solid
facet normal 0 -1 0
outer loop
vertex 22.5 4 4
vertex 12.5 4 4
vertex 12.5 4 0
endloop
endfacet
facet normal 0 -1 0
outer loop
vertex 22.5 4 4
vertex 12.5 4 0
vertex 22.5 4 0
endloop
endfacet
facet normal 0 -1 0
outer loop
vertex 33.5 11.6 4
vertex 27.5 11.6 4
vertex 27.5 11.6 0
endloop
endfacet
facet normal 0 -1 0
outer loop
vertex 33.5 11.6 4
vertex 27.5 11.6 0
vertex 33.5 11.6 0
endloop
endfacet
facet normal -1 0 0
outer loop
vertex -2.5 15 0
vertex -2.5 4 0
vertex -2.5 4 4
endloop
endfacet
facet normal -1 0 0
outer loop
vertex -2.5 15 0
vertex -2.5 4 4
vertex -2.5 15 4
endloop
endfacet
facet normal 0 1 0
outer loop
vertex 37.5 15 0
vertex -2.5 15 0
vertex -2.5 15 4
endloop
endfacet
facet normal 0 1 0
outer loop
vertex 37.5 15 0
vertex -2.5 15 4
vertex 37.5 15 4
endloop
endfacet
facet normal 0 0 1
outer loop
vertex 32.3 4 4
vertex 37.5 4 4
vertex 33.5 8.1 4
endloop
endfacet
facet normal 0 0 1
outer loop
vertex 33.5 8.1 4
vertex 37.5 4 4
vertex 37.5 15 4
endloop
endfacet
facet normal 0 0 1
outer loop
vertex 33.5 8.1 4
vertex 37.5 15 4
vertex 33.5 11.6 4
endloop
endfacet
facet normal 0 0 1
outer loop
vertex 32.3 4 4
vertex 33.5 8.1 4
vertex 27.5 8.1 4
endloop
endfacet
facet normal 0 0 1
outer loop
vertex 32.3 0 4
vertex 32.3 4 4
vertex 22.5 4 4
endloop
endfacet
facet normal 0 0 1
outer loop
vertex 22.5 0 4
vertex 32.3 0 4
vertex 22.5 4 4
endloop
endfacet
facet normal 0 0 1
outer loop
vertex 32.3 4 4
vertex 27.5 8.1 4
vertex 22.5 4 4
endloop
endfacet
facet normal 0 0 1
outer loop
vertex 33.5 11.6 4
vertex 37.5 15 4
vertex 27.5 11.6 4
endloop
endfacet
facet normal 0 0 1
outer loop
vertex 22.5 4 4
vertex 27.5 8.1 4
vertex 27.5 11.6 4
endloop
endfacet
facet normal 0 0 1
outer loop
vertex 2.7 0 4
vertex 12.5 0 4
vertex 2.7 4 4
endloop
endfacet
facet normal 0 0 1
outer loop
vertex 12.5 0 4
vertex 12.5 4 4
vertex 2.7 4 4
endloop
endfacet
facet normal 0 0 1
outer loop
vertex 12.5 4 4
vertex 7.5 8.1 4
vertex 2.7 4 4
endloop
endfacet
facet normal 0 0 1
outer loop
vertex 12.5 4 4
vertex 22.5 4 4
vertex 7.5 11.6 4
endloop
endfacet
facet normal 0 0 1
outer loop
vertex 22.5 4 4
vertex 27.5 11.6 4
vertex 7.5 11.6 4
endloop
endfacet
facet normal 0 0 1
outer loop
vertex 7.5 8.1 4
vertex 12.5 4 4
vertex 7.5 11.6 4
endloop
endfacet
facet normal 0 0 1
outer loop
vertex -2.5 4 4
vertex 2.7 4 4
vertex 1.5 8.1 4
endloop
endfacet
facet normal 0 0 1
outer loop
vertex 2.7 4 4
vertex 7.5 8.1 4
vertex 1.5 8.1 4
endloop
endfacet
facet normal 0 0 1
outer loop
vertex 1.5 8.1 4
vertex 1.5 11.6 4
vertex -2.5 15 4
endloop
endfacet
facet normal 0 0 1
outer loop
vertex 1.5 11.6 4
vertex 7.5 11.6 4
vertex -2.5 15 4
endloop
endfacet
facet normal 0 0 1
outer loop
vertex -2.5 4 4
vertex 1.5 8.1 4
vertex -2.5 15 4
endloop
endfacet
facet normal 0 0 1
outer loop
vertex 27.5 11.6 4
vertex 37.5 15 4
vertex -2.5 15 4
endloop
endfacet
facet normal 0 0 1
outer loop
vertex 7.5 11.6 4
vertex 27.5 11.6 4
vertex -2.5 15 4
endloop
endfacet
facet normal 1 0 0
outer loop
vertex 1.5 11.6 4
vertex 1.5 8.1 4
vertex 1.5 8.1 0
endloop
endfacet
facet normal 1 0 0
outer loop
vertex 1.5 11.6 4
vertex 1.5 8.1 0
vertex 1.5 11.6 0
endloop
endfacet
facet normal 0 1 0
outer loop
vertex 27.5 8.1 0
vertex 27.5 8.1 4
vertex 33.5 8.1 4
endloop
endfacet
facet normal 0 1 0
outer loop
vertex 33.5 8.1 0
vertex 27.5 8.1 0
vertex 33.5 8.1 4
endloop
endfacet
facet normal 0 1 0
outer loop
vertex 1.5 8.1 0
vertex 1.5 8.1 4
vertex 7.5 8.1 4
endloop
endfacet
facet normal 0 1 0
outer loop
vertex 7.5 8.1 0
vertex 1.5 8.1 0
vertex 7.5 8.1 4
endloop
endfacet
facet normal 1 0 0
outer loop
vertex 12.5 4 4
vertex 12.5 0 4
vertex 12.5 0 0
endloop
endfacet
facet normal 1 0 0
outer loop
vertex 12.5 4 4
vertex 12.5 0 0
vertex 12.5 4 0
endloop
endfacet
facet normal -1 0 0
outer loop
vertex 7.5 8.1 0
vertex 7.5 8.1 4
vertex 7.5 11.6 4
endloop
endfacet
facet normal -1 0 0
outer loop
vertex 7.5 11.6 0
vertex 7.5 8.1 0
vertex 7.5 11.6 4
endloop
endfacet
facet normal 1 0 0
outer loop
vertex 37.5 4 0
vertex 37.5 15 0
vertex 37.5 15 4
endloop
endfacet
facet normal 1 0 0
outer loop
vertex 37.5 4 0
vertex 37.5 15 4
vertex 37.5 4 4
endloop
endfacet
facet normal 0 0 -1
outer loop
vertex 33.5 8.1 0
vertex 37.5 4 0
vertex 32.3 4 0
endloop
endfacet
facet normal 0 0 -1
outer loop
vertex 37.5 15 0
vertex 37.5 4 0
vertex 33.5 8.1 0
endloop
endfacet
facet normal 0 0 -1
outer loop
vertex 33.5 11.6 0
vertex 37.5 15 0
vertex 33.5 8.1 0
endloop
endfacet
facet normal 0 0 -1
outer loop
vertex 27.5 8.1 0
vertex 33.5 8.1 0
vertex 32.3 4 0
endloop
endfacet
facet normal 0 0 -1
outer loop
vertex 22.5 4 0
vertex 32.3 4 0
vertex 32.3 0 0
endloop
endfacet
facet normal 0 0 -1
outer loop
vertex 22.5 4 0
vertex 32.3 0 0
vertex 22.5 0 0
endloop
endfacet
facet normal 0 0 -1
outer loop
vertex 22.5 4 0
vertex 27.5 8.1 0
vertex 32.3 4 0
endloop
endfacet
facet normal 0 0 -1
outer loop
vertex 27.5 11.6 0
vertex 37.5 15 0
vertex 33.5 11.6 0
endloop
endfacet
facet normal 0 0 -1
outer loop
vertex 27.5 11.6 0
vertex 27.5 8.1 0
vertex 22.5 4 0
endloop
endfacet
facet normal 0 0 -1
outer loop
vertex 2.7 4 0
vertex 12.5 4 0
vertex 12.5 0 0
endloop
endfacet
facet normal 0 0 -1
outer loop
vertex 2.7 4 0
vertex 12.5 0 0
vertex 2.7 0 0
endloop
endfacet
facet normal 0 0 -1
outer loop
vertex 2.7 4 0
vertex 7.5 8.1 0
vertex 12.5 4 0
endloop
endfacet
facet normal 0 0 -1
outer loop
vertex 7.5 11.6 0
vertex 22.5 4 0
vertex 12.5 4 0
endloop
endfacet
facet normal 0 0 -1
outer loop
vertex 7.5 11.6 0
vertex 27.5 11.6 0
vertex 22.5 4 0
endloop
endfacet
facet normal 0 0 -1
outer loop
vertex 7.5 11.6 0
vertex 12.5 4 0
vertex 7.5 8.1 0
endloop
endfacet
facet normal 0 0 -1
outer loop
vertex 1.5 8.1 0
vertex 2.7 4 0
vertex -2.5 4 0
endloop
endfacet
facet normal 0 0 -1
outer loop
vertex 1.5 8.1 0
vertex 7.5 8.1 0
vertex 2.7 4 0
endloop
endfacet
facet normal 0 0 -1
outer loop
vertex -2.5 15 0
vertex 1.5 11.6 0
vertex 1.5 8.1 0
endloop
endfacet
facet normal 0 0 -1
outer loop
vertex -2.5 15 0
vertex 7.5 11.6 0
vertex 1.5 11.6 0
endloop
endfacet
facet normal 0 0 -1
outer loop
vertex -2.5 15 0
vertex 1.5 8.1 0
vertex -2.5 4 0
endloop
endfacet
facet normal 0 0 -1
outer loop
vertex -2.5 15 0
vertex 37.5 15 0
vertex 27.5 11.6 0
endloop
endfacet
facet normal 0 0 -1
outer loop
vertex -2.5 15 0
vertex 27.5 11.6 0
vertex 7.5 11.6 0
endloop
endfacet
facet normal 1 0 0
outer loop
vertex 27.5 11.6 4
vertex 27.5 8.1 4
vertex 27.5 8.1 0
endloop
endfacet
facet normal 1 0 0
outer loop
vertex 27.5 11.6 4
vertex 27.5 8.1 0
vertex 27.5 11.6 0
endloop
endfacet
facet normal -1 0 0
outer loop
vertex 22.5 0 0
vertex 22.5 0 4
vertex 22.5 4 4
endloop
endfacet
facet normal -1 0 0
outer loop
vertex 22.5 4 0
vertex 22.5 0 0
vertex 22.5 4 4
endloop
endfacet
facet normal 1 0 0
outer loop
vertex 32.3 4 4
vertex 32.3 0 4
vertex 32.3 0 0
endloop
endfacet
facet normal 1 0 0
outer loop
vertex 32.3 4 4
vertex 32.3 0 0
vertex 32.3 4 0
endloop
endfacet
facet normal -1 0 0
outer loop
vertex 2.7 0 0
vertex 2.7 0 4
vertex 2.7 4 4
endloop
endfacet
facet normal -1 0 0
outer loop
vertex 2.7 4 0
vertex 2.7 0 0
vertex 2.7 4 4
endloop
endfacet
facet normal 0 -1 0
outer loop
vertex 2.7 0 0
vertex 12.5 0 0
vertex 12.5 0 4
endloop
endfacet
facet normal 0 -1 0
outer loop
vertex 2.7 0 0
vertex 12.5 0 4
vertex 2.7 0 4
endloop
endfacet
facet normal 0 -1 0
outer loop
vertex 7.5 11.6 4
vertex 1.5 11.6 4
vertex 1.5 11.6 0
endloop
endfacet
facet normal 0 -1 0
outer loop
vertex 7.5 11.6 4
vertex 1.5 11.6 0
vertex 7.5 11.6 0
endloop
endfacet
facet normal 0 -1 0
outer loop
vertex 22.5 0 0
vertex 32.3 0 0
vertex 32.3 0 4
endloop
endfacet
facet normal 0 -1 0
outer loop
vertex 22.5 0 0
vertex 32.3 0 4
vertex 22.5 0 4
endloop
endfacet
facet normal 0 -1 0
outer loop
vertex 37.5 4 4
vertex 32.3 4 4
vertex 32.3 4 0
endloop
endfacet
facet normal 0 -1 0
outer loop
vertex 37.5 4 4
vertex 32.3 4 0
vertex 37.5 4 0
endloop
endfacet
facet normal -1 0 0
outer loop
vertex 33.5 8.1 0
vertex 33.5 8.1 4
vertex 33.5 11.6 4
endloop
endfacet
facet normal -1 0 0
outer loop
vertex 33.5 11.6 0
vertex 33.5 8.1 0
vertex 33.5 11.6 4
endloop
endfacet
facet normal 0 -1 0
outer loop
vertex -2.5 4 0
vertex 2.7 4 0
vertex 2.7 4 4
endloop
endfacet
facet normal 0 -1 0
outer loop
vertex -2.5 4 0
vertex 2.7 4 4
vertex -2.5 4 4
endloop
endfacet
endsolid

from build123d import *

# Parameters (mm, degrees)
AUFSATZ_LINEAR_AUSTRAGEN1_DEPTH = 4
SCHNITT_LINEAR_AUSTRAGEN1_REACH = 6
SKIZZE3_W                       = 2.7
SKIZZE3_H                       = 4
SKIZZE3_W_2                     = 10
SCHNITT_LINEAR_AUSTRAGEN2_REACH = 6
SKIZZE4_W                       = 6
SKIZZE4_H                       = 3.5


with BuildPart() as part:
    # Skizze2 → Aufsatz-Linear austragen1 (new body)
    with BuildSketch(Plane.XY):
        Polygon((0, 0), (0, 4), (-2.5, 4), (-2.5, 15), (37.5, 15), (37.5, 4), (35, 4), (35, 0), align=None)
    extrude(amount=AUFSATZ_LINEAR_AUSTRAGEN1_DEPTH)

    # Skizze3 → Schnitt-Linear austragen1 (cut, up to next)
    with BuildSketch(Plane.XY.offset(4), mode=Mode.PRIVATE) as schnitt_linear_austragen1_sk1:
        with Locations((1.35, 2)):
            Rectangle(SKIZZE3_W, SKIZZE3_H)
    schnitt_linear_austragen1_tool1 = extrude(schnitt_linear_austragen1_sk1.sketch, amount=-SCHNITT_LINEAR_AUSTRAGEN1_REACH, mode=Mode.PRIVATE) & part.part
    add(schnitt_linear_austragen1_tool1.solids().sort_by_distance((1.35, 2, 4))[0], mode=Mode.SUBTRACT)
    # Skizze3 → Schnitt-Linear austragen1 (cut, up to next)
    with BuildSketch(Plane.XY.offset(4), mode=Mode.PRIVATE) as schnitt_linear_austragen1_sk2:
        with Locations((17.5, 2)):
            Rectangle(SKIZZE3_W_2, SKIZZE3_H)
    schnitt_linear_austragen1_tool2 = extrude(schnitt_linear_austragen1_sk2.sketch, amount=-SCHNITT_LINEAR_AUSTRAGEN1_REACH, mode=Mode.PRIVATE) & part.part
    add(schnitt_linear_austragen1_tool2.solids().sort_by_distance((17.5, 2, 4))[0], mode=Mode.SUBTRACT)
    # Skizze3 → Schnitt-Linear austragen1 (cut, up to next)
    with BuildSketch(Plane.XY.offset(4), mode=Mode.PRIVATE) as schnitt_linear_austragen1_sk3:
        with Locations((33.65, 2)):
            Rectangle(SKIZZE3_W, SKIZZE3_H)
    schnitt_linear_austragen1_tool3 = extrude(schnitt_linear_austragen1_sk3.sketch, amount=-SCHNITT_LINEAR_AUSTRAGEN1_REACH, mode=Mode.PRIVATE) & part.part
    add(schnitt_linear_austragen1_tool3.solids().sort_by_distance((33.65, 2, 4))[0], mode=Mode.SUBTRACT)

    # Skizze4 → Schnitt-Linear austragen2 (cut, up to next)
    with BuildSketch(Plane.XY.offset(4), mode=Mode.PRIVATE) as schnitt_linear_austragen2_sk1:
        with Locations((4.5, 9.85)):
            Rectangle(SKIZZE4_W, SKIZZE4_H)
    schnitt_linear_austragen2_tool1 = extrude(schnitt_linear_austragen2_sk1.sketch, amount=-SCHNITT_LINEAR_AUSTRAGEN2_REACH, mode=Mode.PRIVATE) & part.part
    add(schnitt_linear_austragen2_tool1.solids().sort_by_distance((4.5, 9.85, 4))[0], mode=Mode.SUBTRACT)
    # Skizze4 → Schnitt-Linear austragen2 (cut, up to next)
    with BuildSketch(Plane.XY.offset(4), mode=Mode.PRIVATE) as schnitt_linear_austragen2_sk2:
        with Locations((30.5, 9.85)):
            Rectangle(SKIZZE4_W, SKIZZE4_H)
    schnitt_linear_austragen2_tool2 = extrude(schnitt_linear_austragen2_sk2.sketch, amount=-SCHNITT_LINEAR_AUSTRAGEN2_REACH, mode=Mode.PRIVATE) & part.part
    add(schnitt_linear_austragen2_tool2.solids().sort_by_distance((30.5, 9.85, 4))[0], mode=Mode.SUBTRACT)


solid = part.part
